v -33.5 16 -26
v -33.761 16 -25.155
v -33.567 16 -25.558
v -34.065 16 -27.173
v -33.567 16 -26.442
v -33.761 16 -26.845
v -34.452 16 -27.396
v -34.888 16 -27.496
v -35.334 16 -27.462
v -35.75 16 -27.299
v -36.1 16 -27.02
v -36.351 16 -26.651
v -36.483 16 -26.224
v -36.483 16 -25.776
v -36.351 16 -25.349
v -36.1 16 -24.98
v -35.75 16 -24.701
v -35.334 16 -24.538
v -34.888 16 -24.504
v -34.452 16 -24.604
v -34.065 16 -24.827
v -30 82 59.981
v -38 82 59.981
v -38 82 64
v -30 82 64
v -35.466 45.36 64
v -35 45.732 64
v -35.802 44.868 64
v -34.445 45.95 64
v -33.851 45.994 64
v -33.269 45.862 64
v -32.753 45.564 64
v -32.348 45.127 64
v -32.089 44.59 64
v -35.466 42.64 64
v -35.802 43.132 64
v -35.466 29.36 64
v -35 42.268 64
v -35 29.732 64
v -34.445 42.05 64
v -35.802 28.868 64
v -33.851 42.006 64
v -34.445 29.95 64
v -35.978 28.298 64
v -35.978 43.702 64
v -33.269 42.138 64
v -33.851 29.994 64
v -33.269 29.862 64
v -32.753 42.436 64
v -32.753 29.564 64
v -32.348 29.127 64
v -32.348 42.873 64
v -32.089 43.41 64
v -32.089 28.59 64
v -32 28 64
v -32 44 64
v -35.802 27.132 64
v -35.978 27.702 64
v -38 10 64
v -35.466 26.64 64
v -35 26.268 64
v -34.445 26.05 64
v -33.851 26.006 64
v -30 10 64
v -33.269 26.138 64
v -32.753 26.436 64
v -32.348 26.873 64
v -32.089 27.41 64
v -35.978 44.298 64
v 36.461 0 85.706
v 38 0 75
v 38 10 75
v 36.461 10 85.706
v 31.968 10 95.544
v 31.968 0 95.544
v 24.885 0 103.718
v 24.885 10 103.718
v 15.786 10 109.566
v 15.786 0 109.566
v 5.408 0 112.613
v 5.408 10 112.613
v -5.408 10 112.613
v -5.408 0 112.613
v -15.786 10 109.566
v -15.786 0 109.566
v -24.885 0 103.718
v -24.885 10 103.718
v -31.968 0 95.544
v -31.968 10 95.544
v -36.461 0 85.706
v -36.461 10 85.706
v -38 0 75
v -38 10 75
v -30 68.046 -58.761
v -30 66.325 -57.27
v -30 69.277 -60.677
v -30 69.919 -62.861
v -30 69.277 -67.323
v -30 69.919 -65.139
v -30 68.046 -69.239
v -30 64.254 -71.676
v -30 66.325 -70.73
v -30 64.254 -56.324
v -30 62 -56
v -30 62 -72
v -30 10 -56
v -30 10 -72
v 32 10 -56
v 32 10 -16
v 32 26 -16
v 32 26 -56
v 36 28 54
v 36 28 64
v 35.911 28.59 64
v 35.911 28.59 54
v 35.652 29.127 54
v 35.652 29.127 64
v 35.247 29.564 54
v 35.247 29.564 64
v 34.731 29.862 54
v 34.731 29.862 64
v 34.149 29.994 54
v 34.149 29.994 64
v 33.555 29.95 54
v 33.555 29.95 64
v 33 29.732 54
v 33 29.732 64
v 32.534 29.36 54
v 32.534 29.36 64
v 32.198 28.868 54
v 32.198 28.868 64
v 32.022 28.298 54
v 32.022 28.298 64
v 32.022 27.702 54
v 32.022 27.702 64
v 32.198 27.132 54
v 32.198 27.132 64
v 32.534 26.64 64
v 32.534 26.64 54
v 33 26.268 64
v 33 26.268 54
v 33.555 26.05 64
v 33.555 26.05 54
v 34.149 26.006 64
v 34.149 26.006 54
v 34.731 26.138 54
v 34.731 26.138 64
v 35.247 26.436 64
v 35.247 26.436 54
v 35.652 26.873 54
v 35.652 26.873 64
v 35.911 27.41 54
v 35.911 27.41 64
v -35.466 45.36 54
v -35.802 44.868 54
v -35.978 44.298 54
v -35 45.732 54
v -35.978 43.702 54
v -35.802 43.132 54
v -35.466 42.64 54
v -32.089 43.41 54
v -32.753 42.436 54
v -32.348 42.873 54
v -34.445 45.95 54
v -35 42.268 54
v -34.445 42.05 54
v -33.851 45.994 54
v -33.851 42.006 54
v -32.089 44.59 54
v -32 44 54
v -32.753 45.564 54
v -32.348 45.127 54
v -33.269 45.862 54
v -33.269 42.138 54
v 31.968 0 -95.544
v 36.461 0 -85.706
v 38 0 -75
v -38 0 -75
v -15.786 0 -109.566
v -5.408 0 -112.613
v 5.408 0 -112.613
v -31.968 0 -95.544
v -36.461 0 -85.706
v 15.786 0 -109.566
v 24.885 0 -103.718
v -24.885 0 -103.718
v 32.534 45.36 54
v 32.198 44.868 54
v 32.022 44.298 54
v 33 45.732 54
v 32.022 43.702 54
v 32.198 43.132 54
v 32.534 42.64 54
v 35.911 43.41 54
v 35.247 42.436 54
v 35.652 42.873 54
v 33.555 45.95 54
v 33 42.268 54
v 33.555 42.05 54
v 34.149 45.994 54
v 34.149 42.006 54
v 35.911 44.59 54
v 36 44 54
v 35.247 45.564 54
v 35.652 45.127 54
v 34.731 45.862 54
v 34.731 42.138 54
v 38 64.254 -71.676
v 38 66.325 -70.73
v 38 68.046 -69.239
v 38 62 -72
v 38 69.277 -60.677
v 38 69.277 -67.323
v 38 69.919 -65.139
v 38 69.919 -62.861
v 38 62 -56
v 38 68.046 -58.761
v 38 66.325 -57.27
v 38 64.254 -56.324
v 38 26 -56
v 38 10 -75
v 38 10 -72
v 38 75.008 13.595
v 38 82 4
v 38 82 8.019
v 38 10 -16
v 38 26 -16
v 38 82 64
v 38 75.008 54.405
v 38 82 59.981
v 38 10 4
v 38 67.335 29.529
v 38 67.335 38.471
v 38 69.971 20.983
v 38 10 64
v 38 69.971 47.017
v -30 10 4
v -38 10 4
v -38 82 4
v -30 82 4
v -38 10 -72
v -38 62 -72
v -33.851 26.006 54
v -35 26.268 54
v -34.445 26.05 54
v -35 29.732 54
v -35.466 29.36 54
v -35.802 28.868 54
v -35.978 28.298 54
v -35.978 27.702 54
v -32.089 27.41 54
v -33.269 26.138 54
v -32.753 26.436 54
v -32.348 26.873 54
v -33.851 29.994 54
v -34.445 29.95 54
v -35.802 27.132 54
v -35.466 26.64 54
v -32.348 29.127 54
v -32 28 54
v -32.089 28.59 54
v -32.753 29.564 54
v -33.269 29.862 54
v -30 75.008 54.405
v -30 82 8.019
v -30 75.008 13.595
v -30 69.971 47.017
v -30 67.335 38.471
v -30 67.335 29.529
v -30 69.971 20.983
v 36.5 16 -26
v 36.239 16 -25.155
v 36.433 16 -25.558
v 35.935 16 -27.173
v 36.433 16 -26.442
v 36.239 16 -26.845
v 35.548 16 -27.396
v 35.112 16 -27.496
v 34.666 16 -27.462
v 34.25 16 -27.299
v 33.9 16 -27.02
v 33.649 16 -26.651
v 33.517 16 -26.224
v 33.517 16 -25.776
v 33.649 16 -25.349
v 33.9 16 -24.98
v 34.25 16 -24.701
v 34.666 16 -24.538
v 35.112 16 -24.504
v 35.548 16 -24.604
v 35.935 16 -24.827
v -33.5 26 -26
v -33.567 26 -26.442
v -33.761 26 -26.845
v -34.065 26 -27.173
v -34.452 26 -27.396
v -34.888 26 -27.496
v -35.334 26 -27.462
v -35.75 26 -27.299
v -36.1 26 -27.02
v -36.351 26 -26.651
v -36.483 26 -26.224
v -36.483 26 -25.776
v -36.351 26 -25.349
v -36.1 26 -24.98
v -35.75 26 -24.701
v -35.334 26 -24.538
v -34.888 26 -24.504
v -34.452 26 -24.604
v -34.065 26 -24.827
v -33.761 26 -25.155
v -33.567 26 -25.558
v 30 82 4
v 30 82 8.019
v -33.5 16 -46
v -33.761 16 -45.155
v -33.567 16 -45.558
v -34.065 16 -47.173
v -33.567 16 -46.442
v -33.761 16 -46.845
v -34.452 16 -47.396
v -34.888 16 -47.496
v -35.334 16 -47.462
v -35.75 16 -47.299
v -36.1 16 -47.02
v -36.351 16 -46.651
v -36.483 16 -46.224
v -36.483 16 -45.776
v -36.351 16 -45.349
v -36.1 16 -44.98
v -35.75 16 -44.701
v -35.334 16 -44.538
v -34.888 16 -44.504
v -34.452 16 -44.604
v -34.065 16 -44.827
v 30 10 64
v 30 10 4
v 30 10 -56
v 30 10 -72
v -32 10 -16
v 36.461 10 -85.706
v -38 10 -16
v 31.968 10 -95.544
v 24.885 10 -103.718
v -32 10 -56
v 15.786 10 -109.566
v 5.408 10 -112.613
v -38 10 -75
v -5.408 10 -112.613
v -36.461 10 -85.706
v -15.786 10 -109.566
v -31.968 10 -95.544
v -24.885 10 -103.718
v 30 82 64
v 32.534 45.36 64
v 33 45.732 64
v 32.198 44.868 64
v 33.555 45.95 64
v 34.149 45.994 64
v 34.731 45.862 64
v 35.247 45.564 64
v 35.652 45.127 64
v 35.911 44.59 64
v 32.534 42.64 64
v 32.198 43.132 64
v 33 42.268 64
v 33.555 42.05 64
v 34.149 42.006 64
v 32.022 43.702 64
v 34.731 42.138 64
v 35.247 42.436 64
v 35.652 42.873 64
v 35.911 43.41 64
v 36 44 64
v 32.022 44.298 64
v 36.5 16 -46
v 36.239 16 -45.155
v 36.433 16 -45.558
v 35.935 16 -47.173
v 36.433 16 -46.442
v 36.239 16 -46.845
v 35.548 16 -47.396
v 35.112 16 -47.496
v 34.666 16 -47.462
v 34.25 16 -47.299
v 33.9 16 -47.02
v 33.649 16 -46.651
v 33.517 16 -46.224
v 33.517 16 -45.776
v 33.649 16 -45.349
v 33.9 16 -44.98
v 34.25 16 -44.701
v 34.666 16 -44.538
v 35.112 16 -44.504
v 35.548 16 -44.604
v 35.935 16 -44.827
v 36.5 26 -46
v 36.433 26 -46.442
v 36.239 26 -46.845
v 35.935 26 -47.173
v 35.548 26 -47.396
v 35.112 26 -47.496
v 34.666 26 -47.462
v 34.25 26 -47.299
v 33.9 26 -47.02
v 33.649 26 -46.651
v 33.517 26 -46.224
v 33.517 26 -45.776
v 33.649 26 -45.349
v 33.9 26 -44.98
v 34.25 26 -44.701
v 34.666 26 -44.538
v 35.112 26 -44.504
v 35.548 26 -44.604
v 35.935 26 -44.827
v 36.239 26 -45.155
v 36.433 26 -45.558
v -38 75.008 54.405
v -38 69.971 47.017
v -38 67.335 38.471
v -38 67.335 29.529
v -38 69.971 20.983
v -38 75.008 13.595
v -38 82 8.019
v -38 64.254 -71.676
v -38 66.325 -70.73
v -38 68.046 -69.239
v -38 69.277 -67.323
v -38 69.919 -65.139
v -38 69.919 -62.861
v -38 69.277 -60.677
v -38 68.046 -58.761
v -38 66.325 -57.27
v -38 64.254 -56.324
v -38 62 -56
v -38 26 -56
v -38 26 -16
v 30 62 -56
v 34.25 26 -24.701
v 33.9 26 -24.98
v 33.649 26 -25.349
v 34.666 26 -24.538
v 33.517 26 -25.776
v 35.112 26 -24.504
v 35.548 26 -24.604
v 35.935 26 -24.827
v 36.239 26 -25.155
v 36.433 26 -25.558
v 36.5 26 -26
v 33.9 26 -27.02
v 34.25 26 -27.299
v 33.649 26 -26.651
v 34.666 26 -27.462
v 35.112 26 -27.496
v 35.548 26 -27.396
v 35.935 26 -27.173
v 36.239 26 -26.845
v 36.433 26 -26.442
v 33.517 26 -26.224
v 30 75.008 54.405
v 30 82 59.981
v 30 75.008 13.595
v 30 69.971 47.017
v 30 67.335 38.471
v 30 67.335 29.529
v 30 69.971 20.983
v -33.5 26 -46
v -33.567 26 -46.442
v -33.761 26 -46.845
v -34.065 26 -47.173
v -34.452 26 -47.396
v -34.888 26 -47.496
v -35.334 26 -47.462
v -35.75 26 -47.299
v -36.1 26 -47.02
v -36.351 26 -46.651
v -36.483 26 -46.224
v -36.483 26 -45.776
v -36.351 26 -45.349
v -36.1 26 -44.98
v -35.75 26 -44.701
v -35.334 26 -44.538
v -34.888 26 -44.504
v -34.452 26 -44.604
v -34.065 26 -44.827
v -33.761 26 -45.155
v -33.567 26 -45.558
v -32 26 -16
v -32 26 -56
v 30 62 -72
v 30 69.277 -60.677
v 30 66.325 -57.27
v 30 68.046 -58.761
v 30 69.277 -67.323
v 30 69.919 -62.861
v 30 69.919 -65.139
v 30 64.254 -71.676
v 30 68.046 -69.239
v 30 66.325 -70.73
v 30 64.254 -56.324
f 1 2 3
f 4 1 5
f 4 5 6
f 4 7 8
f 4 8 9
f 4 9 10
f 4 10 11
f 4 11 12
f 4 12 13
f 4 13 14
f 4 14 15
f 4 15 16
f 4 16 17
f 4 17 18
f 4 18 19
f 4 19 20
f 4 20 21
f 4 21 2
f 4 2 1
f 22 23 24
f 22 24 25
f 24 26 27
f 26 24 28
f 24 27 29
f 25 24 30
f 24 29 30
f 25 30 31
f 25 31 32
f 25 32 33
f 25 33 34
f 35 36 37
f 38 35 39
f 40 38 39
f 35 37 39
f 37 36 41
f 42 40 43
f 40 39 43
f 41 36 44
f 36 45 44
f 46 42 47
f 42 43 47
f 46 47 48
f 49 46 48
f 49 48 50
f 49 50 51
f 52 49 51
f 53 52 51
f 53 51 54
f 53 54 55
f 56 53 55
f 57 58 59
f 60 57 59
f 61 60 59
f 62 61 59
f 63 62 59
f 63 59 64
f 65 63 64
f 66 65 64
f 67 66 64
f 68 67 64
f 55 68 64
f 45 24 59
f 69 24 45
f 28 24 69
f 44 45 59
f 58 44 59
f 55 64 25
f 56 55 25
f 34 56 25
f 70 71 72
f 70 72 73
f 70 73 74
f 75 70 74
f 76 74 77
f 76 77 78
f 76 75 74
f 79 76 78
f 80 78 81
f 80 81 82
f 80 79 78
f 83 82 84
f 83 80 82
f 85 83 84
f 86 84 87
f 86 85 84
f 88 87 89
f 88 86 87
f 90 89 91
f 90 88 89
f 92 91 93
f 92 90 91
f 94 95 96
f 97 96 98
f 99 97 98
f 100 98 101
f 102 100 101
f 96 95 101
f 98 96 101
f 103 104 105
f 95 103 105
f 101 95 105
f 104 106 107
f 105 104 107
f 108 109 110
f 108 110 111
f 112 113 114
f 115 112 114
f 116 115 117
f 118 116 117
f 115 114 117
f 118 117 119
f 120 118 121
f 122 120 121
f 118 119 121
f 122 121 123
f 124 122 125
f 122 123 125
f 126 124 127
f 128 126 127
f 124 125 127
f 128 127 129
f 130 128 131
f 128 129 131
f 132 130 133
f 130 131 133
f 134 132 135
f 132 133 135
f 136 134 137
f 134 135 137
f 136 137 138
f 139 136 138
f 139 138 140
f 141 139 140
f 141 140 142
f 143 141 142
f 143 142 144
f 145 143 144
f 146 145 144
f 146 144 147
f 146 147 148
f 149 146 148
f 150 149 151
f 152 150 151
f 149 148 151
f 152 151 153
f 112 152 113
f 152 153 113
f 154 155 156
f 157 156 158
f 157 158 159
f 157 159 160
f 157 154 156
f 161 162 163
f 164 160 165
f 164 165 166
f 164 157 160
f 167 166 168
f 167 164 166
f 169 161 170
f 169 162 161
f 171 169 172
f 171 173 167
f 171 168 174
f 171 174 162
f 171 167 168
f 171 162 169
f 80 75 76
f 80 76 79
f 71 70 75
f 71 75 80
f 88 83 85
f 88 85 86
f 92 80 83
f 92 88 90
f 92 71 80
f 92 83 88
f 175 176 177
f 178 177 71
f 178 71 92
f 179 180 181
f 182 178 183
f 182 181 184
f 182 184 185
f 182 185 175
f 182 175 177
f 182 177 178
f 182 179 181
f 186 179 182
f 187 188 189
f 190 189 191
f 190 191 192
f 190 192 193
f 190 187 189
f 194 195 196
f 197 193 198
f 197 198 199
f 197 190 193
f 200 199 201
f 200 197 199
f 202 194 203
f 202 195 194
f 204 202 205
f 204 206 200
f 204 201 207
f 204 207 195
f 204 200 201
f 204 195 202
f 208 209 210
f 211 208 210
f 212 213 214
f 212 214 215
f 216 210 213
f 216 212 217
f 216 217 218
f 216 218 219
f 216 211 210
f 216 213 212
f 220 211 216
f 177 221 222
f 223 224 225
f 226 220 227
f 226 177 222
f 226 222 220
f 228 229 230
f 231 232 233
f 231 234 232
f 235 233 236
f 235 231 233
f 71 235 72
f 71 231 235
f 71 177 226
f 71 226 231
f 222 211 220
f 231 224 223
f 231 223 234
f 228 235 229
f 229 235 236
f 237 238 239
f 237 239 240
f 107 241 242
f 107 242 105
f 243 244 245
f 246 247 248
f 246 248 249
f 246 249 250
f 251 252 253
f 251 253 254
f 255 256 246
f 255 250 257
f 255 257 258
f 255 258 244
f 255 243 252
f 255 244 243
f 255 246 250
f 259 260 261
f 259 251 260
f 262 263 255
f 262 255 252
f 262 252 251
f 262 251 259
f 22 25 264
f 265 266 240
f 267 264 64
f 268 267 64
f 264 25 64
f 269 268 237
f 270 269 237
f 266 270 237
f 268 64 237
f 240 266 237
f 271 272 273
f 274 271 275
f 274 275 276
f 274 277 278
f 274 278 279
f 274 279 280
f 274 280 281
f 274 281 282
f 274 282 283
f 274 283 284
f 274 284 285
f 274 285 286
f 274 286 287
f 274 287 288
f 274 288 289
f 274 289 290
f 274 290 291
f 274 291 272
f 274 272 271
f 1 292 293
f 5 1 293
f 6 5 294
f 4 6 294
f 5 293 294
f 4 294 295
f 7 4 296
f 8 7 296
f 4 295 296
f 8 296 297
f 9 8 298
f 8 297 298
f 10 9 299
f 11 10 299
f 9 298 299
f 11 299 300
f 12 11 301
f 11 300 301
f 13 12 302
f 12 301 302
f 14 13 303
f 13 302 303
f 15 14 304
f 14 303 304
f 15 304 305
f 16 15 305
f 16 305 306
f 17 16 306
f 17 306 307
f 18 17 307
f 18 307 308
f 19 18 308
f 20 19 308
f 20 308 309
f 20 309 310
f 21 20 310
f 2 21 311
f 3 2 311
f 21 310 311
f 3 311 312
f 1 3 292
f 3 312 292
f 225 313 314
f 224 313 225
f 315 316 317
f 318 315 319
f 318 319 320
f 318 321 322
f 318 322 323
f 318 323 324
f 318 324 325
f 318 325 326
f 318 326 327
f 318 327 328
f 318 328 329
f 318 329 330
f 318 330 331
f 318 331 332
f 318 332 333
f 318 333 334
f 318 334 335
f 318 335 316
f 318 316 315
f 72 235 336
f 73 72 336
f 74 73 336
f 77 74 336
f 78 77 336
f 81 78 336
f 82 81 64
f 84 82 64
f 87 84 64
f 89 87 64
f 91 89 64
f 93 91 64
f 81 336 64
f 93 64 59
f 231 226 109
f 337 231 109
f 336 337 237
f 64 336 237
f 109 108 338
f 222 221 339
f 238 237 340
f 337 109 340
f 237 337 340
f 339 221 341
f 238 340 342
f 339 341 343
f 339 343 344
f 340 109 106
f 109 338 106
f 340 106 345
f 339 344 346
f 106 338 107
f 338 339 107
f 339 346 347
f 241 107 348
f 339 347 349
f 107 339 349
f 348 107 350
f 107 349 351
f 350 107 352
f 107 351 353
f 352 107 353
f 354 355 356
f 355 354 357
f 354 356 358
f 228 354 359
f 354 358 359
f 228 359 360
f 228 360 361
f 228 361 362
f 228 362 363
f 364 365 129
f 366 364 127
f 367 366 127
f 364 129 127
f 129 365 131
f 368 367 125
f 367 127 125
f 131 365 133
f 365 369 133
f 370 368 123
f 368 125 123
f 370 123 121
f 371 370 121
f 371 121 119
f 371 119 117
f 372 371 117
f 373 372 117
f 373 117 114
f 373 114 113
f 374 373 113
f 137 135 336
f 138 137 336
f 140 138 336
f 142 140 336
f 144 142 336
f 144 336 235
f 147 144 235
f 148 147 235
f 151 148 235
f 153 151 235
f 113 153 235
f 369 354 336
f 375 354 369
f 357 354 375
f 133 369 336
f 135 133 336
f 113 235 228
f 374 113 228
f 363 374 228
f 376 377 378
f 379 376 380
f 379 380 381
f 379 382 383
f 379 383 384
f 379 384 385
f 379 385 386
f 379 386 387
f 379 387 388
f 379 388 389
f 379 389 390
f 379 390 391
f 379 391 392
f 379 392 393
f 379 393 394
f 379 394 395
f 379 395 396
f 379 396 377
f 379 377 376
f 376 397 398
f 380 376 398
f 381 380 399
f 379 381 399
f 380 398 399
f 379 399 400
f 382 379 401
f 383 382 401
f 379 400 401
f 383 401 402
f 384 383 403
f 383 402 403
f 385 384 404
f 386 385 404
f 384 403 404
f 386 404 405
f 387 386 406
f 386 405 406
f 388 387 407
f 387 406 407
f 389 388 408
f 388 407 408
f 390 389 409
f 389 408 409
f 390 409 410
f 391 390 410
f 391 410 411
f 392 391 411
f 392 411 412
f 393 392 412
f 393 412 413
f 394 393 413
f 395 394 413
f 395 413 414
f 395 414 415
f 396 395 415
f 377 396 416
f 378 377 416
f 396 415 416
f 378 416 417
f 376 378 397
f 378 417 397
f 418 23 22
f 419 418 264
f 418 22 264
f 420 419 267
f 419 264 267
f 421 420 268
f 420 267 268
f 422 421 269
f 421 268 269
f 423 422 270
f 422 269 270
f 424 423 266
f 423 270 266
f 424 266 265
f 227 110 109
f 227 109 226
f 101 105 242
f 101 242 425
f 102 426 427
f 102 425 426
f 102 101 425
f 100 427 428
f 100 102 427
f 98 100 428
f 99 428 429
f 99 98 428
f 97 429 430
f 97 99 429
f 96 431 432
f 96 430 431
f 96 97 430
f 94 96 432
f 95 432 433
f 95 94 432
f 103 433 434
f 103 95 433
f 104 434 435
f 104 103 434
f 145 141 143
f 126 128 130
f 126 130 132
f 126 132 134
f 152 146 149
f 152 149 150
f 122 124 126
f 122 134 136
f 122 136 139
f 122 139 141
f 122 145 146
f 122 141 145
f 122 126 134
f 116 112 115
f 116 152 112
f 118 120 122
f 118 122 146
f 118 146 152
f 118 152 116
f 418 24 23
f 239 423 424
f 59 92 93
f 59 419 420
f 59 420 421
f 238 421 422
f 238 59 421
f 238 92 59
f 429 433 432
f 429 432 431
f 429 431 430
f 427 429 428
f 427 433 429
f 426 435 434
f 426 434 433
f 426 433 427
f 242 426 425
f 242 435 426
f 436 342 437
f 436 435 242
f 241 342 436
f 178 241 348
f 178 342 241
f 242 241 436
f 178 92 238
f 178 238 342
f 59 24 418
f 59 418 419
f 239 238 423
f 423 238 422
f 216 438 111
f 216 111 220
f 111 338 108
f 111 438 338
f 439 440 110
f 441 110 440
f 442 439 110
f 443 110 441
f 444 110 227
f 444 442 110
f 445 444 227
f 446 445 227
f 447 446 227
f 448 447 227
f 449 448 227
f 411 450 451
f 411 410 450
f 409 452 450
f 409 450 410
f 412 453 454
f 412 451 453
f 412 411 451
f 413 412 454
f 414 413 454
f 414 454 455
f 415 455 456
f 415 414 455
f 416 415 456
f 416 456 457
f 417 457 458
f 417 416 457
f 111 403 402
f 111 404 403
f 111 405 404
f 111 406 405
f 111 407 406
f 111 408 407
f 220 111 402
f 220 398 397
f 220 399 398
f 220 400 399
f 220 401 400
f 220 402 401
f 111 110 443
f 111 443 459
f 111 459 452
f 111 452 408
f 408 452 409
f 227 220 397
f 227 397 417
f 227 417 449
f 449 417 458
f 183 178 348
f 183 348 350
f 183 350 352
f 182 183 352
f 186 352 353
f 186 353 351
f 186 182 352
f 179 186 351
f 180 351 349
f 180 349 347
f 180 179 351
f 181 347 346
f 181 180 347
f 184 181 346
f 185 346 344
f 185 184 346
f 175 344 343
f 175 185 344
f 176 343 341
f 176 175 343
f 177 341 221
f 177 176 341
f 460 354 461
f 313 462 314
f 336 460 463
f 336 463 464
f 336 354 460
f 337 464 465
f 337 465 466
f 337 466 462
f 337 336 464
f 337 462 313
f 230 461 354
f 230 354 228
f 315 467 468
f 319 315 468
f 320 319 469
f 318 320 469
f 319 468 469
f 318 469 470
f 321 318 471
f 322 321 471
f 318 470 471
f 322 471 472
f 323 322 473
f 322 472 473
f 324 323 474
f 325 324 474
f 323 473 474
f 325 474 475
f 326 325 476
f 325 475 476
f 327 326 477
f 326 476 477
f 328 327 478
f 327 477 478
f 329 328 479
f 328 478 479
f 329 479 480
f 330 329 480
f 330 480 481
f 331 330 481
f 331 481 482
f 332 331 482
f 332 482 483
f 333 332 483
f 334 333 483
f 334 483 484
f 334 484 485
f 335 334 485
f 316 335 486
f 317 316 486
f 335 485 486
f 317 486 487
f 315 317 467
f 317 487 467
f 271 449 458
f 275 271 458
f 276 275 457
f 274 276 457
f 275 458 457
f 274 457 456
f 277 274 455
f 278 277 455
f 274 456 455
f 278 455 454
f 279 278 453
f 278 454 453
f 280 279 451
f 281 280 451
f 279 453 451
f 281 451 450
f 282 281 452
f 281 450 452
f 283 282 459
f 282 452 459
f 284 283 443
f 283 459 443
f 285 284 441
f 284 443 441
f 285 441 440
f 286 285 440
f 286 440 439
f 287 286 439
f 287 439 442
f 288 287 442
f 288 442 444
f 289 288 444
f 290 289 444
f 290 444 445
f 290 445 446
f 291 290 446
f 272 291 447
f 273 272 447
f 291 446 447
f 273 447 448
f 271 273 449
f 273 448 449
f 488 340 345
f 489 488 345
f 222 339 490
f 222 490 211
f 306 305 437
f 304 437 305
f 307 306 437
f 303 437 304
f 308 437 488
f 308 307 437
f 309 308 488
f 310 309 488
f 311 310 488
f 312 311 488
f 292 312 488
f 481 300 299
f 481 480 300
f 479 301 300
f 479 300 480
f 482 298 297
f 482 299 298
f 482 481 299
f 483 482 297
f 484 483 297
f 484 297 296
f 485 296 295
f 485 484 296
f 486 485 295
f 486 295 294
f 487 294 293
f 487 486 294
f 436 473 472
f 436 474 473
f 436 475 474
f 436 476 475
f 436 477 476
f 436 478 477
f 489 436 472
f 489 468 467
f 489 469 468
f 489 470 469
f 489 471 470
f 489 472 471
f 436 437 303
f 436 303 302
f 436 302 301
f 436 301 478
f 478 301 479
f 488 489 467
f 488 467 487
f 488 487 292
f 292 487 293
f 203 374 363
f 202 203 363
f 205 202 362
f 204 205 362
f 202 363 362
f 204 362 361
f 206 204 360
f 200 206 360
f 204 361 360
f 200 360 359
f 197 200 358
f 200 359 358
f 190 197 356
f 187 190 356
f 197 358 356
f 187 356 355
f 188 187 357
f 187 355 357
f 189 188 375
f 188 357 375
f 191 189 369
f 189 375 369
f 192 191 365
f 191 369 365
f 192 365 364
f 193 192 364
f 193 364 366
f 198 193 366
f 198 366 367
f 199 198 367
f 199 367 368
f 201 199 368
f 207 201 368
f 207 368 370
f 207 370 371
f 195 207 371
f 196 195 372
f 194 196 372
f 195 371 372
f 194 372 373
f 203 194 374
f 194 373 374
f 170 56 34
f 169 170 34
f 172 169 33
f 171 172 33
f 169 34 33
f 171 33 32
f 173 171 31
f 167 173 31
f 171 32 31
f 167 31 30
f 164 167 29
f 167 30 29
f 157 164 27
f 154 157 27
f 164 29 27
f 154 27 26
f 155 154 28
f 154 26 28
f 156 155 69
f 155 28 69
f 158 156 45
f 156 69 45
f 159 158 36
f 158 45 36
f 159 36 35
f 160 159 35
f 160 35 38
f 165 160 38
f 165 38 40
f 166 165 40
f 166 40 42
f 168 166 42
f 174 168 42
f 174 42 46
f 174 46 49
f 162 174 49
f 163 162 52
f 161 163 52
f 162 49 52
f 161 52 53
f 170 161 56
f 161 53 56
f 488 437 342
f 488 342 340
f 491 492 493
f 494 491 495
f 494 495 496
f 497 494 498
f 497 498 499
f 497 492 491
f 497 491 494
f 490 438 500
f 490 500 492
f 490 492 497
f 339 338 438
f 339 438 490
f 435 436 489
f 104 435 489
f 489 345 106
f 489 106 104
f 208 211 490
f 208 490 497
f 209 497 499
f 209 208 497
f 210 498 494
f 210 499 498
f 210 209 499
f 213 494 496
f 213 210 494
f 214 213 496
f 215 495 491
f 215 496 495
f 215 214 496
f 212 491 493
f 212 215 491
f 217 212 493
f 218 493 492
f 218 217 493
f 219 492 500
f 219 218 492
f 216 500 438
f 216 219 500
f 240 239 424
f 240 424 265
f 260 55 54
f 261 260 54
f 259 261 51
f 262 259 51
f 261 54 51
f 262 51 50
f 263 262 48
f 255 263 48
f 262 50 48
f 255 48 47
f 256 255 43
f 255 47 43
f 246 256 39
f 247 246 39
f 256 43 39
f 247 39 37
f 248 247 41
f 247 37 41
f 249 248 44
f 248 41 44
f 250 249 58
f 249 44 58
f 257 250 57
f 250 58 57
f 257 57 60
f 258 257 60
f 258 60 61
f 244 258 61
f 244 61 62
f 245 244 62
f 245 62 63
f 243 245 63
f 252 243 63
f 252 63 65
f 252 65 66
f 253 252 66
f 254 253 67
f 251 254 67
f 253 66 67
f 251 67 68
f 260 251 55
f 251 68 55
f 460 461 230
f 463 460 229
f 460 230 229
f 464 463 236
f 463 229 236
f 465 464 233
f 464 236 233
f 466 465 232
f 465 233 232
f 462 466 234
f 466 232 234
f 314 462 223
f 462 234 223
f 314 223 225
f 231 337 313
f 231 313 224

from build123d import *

# Parameters (mm, degrees)
EXTRUDE_1_DEPTH     = 10
SKETCH_3_W          = 8
SKETCH_3_H          = 60
EXTRUDE_2_DEPTH     = 72
SKETCH_4_W          = 6
SKETCH_4_H          = 40
EXTRUDE_3_DEPTH     = 16
SKETCH_5_R          = 30
CUT_EXTRUDE_1_DEPTH = 77
SKETCH_6_R          = 2
CUT_EXTRUDE_2_DEPTH = 10
SKETCH_7_R          = 1.5
CUT_EXTRUDE_3_DEPTH = 10
SKETCH_8_W          = 8
SKETCH_8_H          = 16
EXTRUDE_4_DEPTH     = 60
CUT_EXTRUDE_4_DEPTH = 77


with BuildPart() as part:
    # 草图1 → 凸台-拉伸1 (new body)
    with BuildSketch(Plane(origin=(0, 0, 0), x_dir=(1, 0, 0), z_dir=(0, 1, 0))):
        with BuildLine():
            Line((-38, -75), (-38, 75))
            ThreePointArc((-38, 75), (0, 113), (38, 75))
            Line((38, 75), (38, -75))
            ThreePointArc((38, -75), (0, -113), (-38, -75))
        make_face()
    extrude(amount=EXTRUDE_1_DEPTH)

    # 草图3 → 凸台-拉伸2 (add)
    with BuildSketch(Plane(origin=(0, 10, 0), x_dir=(1, 0, 0), z_dir=(0, 1, 0))):
        with Locations((-34, -34)):
            Rectangle(SKETCH_3_W, SKETCH_3_H)
        with Locations((34, -34)):
            Rectangle(SKETCH_3_W, SKETCH_3_H)
    extrude(amount=EXTRUDE_2_DEPTH)

    # 草图4 → 凸台-拉伸3 (add)
    with BuildSketch(Plane(origin=(0, 10, 0), x_dir=(1, 0, 0), z_dir=(0, 1, 0))):
        with Locations((-35, 36)):
            Rectangle(SKETCH_4_W, SKETCH_4_H)
        with Locations((35, 36)):
            Rectangle(SKETCH_4_W, SKETCH_4_H)
    extrude(amount=EXTRUDE_3_DEPTH)

    # 草图5 → 切除-拉伸1 (cut, through all)
    with BuildSketch(Plane(origin=(38, 0, 0), x_dir=(0, 0, -1), z_dir=(1, 0, 0))):
        with Locations((-34, 97)):
            Circle(SKETCH_5_R)
    extrude(amount=-CUT_EXTRUDE_1_DEPTH, mode=Mode.SUBTRACT)

    # 草图6 → 切除-拉伸2 (cut)
    with BuildSketch(Plane.XY.offset(64)):
        with Locations((-34, 44)):
            Circle(SKETCH_6_R)
        with Locations((-34, 28)):
            Circle(SKETCH_6_R)
        with Locations((34, 44)):
            Circle(SKETCH_6_R)
        with Locations((34, 28)):
            Circle(SKETCH_6_R)
    extrude(amount=-CUT_EXTRUDE_2_DEPTH, mode=Mode.SUBTRACT)

    # 草图7 → 切除-拉伸3 (cut)
    with BuildSketch(Plane(origin=(0, 26, 0), x_dir=(1, 0, 0), z_dir=(0, 1, 0))):
        with Locations((-35, 26)):
            Circle(SKETCH_7_R)
        with Locations((-35, 46)):
            Circle(SKETCH_7_R)
        with Locations((35, 26)):
            Circle(SKETCH_7_R)
        with Locations((35, 46)):
            Circle(SKETCH_7_R)
    extrude(amount=-CUT_EXTRUDE_3_DEPTH, mode=Mode.SUBTRACT)

    # 草图8 → 凸台-拉伸4 (add)
    with BuildSketch(Plane(origin=(0, 10, 0), x_dir=(1, 0, 0), z_dir=(0, 1, 0))):
        with Locations((-34, 64)):
            Rectangle(SKETCH_8_W, SKETCH_8_H)
        with Locations((34, 64)):
            Rectangle(SKETCH_8_W, SKETCH_8_H)
    extrude(amount=EXTRUDE_4_DEPTH)

    # 草图9 → 切除-拉伸4 (cut, through all)
    with BuildSketch(Plane(origin=(38, 0, 0), x_dir=(0, 0, -1), z_dir=(1, 0, 0))):
        with BuildLine():
            Line((56, 62), (56, 75))
            Line((56, 75), (72, 75))
            Line((72, 75), (72, 62))
            ThreePointArc((72, 62), (64, 70), (56, 62))
        make_face()
    extrude(amount=-CUT_EXTRUDE_4_DEPTH, mode=Mode.SUBTRACT)


solid = part.part
